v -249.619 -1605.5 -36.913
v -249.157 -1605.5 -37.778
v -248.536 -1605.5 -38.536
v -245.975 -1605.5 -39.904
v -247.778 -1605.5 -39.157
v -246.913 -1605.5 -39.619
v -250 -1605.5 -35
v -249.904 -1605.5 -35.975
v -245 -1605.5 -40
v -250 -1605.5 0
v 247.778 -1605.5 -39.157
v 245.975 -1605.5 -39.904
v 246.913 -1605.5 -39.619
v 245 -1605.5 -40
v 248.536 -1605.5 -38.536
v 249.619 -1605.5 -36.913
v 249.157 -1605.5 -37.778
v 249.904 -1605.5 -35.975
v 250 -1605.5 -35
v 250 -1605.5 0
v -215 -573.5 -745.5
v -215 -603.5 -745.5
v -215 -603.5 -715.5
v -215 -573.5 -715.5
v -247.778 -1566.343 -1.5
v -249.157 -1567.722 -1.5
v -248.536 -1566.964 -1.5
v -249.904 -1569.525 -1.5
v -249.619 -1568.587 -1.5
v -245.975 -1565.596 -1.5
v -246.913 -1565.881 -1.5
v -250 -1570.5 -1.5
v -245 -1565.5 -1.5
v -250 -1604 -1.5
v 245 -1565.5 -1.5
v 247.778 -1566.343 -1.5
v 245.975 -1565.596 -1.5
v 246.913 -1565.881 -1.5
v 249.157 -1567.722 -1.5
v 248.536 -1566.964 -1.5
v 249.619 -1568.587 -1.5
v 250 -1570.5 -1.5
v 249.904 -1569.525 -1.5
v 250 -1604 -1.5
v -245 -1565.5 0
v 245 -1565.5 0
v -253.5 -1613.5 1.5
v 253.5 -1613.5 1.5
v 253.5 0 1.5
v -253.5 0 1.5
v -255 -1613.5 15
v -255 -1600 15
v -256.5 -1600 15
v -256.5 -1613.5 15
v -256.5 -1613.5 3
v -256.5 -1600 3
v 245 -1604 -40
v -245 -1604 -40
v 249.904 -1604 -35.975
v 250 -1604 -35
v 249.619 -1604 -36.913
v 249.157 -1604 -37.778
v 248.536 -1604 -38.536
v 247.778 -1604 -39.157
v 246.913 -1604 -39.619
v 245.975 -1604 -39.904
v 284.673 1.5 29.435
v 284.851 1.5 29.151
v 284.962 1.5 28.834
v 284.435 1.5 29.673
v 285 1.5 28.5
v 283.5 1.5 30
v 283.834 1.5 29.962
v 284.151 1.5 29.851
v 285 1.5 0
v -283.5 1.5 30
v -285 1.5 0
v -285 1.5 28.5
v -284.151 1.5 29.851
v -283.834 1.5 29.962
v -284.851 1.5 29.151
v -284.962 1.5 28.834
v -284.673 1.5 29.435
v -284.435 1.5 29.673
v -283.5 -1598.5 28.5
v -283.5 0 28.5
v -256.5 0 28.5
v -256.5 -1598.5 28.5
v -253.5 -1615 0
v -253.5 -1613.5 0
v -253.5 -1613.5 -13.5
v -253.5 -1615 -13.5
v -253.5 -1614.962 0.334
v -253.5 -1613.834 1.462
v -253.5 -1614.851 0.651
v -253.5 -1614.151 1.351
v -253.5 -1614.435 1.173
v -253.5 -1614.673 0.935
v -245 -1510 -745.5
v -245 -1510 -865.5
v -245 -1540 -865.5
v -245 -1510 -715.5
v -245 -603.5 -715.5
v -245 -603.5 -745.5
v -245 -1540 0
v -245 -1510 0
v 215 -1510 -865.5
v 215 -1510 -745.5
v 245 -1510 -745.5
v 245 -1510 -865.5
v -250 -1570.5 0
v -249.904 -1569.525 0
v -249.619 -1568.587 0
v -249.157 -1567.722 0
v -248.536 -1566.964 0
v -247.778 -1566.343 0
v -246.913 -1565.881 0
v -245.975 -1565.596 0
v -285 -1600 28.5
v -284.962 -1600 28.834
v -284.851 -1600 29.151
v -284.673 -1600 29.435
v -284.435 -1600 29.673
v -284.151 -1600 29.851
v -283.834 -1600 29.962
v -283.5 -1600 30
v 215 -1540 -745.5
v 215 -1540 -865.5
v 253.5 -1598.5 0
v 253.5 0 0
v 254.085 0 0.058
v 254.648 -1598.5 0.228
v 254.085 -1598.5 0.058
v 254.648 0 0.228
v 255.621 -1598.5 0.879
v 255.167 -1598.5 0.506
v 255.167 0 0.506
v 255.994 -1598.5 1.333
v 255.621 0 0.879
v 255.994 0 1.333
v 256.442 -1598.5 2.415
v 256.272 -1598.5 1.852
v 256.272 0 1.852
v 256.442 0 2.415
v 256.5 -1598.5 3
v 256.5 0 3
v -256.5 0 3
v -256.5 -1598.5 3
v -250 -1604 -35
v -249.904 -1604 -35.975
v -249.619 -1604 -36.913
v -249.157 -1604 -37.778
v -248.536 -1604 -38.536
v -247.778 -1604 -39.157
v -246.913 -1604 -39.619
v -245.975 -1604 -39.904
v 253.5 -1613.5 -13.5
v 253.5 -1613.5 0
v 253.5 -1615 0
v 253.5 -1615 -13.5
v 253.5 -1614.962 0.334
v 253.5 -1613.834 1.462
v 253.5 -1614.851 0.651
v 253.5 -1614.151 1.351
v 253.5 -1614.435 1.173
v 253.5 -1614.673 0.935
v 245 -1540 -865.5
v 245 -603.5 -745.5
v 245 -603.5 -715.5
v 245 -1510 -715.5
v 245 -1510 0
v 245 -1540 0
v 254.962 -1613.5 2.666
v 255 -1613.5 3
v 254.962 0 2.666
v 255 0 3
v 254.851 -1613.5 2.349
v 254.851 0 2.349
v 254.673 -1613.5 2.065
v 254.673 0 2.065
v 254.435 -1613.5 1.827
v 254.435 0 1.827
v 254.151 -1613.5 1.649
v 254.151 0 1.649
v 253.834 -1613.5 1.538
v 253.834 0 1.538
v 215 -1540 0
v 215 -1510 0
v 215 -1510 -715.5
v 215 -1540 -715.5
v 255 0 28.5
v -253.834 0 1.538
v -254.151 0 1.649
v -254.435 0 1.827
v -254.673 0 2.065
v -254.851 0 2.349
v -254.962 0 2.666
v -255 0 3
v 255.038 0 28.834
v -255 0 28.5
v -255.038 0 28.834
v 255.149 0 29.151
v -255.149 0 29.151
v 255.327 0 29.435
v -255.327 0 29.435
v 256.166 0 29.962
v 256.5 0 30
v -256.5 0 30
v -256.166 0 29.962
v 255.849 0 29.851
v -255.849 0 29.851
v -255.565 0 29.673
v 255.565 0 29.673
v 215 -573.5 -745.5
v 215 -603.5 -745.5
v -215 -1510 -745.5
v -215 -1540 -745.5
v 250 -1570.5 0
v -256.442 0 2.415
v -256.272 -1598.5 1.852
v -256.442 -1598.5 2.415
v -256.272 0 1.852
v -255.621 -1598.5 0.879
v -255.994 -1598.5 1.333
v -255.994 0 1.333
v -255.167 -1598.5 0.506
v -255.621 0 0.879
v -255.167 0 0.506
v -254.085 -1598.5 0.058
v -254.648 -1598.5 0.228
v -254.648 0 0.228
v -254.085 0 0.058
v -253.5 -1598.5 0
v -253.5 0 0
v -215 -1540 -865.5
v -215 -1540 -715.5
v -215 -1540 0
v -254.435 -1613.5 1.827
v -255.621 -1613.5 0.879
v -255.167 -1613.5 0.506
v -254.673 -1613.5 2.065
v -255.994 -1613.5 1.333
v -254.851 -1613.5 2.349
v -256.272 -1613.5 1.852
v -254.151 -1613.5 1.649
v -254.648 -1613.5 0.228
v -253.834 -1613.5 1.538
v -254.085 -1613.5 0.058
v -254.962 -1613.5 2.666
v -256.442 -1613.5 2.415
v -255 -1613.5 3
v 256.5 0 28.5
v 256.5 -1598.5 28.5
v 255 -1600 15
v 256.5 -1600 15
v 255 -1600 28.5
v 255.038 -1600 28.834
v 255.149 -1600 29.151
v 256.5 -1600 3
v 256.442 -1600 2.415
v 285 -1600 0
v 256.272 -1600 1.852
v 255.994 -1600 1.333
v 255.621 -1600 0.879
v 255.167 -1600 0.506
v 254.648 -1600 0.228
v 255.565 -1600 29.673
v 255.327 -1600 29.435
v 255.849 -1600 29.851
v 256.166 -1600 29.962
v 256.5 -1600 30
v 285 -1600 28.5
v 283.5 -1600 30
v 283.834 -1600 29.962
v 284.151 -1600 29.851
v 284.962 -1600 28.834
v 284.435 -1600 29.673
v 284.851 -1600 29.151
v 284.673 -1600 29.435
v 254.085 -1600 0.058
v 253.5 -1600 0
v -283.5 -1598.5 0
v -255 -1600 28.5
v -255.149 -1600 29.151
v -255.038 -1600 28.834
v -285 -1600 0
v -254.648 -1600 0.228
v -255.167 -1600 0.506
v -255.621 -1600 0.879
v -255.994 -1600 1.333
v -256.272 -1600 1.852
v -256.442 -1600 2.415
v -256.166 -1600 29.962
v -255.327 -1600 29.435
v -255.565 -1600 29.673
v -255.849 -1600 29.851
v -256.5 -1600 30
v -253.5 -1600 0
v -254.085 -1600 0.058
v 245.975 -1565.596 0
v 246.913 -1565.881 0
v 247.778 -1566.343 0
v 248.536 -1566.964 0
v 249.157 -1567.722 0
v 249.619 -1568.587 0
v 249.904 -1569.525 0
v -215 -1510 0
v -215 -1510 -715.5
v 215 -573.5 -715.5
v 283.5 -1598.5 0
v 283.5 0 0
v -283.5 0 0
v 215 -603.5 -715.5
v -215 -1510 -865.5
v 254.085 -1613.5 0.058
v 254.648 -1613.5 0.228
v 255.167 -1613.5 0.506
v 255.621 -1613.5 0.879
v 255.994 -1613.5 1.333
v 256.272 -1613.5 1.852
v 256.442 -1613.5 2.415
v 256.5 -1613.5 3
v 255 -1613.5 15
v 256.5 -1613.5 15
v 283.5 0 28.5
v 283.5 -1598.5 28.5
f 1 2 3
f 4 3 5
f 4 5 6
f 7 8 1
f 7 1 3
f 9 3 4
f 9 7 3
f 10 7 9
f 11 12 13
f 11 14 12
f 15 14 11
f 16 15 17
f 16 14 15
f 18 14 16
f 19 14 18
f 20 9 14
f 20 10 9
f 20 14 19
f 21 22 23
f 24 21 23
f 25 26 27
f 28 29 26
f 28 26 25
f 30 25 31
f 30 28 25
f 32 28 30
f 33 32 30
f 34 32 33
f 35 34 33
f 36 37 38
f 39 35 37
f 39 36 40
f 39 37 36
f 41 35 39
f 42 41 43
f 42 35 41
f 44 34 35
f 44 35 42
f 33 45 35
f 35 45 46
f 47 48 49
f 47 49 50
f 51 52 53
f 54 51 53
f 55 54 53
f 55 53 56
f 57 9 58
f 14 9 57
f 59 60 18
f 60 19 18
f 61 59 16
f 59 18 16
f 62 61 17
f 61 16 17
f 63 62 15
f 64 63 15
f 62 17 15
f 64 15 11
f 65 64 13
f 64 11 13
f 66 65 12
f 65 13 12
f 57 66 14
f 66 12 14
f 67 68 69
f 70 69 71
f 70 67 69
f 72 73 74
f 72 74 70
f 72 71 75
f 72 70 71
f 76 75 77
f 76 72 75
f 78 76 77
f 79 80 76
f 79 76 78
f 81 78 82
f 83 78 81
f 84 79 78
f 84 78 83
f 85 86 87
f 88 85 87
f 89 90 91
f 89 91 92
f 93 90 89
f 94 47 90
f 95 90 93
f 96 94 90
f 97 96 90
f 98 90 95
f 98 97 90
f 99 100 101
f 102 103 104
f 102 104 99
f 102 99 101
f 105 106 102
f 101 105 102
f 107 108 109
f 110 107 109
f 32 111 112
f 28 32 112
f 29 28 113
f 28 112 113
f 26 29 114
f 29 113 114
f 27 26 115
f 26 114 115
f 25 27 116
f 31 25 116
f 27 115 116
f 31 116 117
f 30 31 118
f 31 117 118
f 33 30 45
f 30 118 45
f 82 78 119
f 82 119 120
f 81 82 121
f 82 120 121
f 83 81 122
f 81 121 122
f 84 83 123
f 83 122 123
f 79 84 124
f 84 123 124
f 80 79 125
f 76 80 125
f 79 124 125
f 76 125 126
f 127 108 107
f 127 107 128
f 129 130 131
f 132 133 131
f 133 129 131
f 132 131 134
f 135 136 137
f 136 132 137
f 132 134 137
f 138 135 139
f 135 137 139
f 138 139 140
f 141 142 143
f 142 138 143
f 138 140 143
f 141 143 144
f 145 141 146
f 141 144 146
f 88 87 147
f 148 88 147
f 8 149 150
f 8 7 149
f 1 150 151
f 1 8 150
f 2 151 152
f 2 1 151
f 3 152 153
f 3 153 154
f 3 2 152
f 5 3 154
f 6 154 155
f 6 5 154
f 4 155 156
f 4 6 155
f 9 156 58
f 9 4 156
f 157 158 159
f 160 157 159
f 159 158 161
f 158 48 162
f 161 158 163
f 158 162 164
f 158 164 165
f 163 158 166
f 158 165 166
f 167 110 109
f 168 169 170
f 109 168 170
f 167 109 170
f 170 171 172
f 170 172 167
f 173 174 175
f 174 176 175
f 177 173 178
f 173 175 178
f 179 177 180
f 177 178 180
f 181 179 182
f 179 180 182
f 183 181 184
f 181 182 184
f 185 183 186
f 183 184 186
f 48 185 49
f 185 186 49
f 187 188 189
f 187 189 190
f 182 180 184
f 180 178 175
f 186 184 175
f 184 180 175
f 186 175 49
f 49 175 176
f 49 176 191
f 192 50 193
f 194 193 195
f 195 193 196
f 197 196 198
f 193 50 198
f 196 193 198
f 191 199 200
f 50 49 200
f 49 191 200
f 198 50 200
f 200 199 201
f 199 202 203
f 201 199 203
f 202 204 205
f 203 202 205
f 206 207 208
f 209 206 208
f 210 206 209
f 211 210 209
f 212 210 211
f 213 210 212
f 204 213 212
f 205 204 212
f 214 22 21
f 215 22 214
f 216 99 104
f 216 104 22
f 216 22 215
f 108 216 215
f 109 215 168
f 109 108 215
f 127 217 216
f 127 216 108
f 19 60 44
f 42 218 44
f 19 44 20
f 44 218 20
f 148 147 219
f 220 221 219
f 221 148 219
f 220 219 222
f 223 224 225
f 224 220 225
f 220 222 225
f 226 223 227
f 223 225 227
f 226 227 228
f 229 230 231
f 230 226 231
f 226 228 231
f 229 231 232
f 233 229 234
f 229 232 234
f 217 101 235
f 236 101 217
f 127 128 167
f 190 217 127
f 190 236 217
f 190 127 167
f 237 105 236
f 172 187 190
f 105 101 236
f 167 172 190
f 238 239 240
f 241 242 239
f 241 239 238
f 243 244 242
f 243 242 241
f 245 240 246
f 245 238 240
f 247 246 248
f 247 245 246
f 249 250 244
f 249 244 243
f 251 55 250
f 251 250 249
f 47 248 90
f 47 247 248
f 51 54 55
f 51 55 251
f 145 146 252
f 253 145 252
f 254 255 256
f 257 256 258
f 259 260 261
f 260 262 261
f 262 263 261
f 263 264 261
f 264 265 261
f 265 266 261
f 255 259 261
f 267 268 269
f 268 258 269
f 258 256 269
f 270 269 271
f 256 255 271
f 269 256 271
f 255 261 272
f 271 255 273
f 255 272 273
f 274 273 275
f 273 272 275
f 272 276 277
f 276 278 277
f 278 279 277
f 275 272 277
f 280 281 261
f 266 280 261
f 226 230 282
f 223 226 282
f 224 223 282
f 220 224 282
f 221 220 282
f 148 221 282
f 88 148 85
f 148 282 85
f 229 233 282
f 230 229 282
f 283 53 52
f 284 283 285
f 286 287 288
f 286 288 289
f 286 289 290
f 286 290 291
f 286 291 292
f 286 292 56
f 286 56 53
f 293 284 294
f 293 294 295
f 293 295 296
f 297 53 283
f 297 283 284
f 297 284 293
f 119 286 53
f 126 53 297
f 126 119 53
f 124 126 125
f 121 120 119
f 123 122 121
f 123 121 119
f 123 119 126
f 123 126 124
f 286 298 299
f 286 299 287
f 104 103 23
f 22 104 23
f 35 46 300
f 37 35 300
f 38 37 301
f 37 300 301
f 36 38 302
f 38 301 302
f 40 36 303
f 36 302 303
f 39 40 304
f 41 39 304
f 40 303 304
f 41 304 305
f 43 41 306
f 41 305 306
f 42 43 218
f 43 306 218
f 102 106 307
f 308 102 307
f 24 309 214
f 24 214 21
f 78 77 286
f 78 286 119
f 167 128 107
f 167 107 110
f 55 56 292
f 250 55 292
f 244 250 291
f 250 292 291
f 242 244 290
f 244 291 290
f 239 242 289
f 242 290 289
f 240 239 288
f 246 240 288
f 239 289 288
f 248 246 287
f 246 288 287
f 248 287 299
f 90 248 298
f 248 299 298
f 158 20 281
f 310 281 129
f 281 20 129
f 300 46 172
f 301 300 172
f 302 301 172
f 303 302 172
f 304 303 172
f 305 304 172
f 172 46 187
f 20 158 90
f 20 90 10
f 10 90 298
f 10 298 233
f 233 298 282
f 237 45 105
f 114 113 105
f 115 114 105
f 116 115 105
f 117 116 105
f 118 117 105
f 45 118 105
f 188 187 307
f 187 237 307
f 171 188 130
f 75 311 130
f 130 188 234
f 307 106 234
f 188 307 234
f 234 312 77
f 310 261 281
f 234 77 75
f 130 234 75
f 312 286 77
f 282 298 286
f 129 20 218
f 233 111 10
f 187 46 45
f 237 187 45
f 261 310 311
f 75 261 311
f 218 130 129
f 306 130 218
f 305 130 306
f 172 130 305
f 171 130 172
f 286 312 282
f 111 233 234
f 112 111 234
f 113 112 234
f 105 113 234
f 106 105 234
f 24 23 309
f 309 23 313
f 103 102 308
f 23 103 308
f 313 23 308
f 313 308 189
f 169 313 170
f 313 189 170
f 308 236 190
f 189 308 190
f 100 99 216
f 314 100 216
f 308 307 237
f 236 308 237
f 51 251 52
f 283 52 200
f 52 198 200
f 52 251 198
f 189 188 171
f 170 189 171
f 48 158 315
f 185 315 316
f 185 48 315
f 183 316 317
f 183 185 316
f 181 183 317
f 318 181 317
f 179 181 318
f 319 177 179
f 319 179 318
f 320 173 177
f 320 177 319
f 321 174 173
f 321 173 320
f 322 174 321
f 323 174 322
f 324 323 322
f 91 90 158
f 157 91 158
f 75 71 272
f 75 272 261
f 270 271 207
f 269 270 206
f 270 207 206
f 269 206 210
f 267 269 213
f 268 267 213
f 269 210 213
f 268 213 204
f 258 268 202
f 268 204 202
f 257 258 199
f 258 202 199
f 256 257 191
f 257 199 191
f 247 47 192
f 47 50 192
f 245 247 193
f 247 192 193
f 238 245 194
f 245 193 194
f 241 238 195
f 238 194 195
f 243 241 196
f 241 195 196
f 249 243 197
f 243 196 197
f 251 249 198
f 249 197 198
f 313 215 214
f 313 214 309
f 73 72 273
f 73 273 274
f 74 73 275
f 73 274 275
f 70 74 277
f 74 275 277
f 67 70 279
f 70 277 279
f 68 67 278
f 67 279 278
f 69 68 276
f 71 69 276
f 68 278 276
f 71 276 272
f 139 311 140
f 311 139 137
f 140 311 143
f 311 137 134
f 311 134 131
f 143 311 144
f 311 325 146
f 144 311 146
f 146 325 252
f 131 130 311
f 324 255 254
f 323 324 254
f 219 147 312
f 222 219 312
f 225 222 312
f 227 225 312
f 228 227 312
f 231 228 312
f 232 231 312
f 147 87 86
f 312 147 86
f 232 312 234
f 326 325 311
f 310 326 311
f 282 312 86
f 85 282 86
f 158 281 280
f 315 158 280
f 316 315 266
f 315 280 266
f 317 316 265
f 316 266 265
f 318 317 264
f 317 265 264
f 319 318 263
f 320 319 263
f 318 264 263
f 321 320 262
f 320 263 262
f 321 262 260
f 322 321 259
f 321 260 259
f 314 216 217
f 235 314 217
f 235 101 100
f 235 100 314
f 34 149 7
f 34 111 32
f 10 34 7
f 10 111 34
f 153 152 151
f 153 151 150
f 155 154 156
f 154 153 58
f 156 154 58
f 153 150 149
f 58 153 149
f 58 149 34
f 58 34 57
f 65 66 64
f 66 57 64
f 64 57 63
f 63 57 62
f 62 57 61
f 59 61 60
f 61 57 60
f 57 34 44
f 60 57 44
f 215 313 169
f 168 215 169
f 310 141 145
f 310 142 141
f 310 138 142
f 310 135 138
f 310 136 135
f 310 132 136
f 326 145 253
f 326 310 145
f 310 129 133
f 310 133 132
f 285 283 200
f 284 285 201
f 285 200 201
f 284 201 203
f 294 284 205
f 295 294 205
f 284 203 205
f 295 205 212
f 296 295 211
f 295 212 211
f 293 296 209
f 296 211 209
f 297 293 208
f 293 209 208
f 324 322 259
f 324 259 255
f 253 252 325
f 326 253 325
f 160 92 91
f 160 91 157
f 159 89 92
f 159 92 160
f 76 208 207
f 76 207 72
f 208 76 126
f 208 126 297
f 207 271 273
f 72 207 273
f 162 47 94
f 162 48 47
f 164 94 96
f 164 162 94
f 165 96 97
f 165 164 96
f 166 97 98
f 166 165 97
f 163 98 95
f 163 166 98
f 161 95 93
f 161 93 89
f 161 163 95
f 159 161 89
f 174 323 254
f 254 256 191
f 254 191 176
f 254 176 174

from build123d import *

# Parameters (mm, degrees)
F1_DEPTH  = 1600
F3_DEPTH  = 1.5
F5_DEPTH  = 13.5
F6_W      = 507
F6_H      = 1.5
F7_ANGLE  = 90
F8_W      = 507
F8_H      = 1.5
F9_DEPTH  = 13.5
F10_W     = 1.5
F10_H     = 28.5
F12_W     = 1.5
F12_H     = 28.5
F15_DEPTH = 1.5
F16_W     = 500
F16_H     = 1.5
F17_DEPTH = 38.5
F18_R     = 5
F19_W     = 30
F19_H     = 30
F20_DEPTH = 865.5
F21_W     = 490
F21_H     = 30
F22_DEPTH = 936.5
F23_W     = 430
F23_H     = 30
F24_DEPTH = 30


with BuildPart() as f1:
    # F0 (on Front) → F1 (new body)
    with BuildSketch(Plane.XZ):
        with BuildLine():
            Line((-285, 28.5), (-285, 0))
            Line((-285, 0), (-283.5, 0))
            Line((-283.5, 0), (-283.5, 28.5))
            Line((-283.5, 28.5), (-256.5, 28.5))
            Line((-256.5, 28.5), (-256.5, 3))
            ThreePointArc((-256.5, 3), (-255.6213203436, 0.8786796564), (-253.5, 0))
            Line((-253.5, 0), (253.5, 0))
            ThreePointArc((253.5, 0), (255.6213203436, 0.8786796564), (256.5, 3))
            Line((256.5, 3), (256.5, 28.5))
            Line((256.5, 28.5), (283.5, 28.5))
            Line((283.5, 28.5), (283.5, 0))
            Line((283.5, 0), (285, 0))
            Line((285, 0), (285, 28.5))
            ThreePointArc((285, 28.5), (284.5606601718, 29.5606601718), (283.5, 30))
            Line((283.5, 30), (256.5, 30))
            ThreePointArc((256.5, 30), (255.4393398282, 29.5606601718), (255, 28.5))
            Line((255, 28.5), (255, 3))
            ThreePointArc((255, 3), (254.5606601718, 1.9393398282), (253.5, 1.5))
            Line((253.5, 1.5), (-253.5, 1.5))
            ThreePointArc((-253.5, 1.5), (-254.5606601718, 1.9393398282), (-255, 3))
            Line((-255, 3), (-255, 28.5))
            ThreePointArc((-255, 28.5), (-255.4393398282, 29.5606601718), (-256.5, 30))
            Line((-256.5, 30), (-283.5, 30))
            ThreePointArc((-283.5, 30), (-284.5606601718, 29.5606601718), (-285, 28.5))
        make_face()
    extrude(amount=F1_DEPTH)

    # F2 (on face) → F3 (join)
    with BuildSketch(Plane(origin=(0, 0, 0), x_dir=(-1, 0, 0), z_dir=(0, 1, 0))):
        with BuildLine():
            ThreePointArc((-283.5, 30), (-284.5606601718, 29.5606601718), (-285, 28.5))
            Line((-285, 28.5), (-285, 0))
            Line((-285, 0), (285, 0))
            Line((285, 0), (285, 28.5))
            ThreePointArc((285, 28.5), (284.5606601718, 29.5606601718), (283.5, 30))
            Line((283.5, 30), (-283.5, 30))
        make_face()
    extrude(amount=F3_DEPTH)

    # F4 (on face) → F5 (join)
    with BuildSketch(Plane.XZ.offset(1600)):
        with BuildLine():
            ThreePointArc((253.5, 0), (255.6213203436, 0.8786796564), (256.5, 3))
            Line((256.5, 3), (256.5, 15))
            Line((256.5, 15), (255, 15))
            Line((255, 15), (255, 3))
            ThreePointArc((255, 3), (254.5606601718, 1.9393398282), (253.5, 1.5))
            Line((253.5, 1.5), (-253.5, 1.5))
            ThreePointArc((-253.5, 1.5), (-254.5606601718, 1.9393398282), (-255, 3))
            Line((-255, 3), (-255, 15))
            Line((-255, 15), (-256.5, 15))
            Line((-256.5, 15), (-256.5, 3))
            ThreePointArc((-256.5, 3), (-255.6213203436, 0.8786796564), (-253.5, 0))
            Line((-253.5, 0), (253.5, 0))
        make_face()
    extrude(amount=F5_DEPTH)

    # F6 (on face) → F7 (revolve)
    with BuildSketch(Plane.XZ.offset(1613.5)):
        with Locations((0, 0.75)):
            Rectangle(F6_W, F6_H)
    revolve(axis=Axis((0, -1613.5, 0), (1, 0, 0)), revolution_arc=F7_ANGLE)

    # F8 (on face) → F9 (join)
    with BuildSketch(Plane(origin=(0, 0, 0), x_dir=(1, 0, 0), z_dir=(0, 0, -1))):
        with Locations((0, 1614.25)):
            Rectangle(F8_W, F8_H)
    extrude(amount=F9_DEPTH)

    # F10 (on face) → F11 (join, up to the next surface of F1)
    with BuildSketch(Plane(origin=(283.5, 0, 0), x_dir=(0, -1, 0), z_dir=(-1, 0, 0))):
        with Locations((1599.25, 14.25)):
            Rectangle(F10_W, F10_H)
    extrude(until=Until.NEXT)

    # F12 (on face) → F13 (join, up to the next surface of F1)
    with BuildSketch(Plane.YZ.offset(-283.5)):
        with Locations((-1599.25, 14.25)):
            Rectangle(F12_W, F12_H)
    extrude(until=Until.NEXT)

    # F14 (on face) → F15 (join)
    with BuildSketch(Plane(origin=(0, 0, 0), x_dir=(1, 0, 0), z_dir=(0, 0, -1))):
        with BuildLine():
            Line((250, 1570.5), (250, 1605.5))
            Line((250, 1605.5), (-250, 1605.5))
            Line((-250, 1605.5), (-250, 1570.5))
            ThreePointArc((-250, 1570.5), (-248.5355339059, 1566.9644660941), (-245, 1565.5))
            Line((-245, 1565.5), (245, 1565.5))
            ThreePointArc((245, 1565.5), (248.5355339059, 1566.9644660941), (250, 1570.5))
        make_face()
    extrude(amount=F15_DEPTH)

    # F16 (on face) → F17 (join)
    with BuildSketch(Plane(origin=(0, 0, -1.5), x_dir=(1, 0, 0), z_dir=(0, 0, -1))):
        with Locations((0, 1604.75)):
            Rectangle(F16_W, F16_H)
    extrude(amount=F17_DEPTH)

    # F18
    f18_edges = [f1.edges().sort_by_distance(p)[0] for p in [
        (-250, -1604.75, -40),
        (250, -1604.75, -40),
    ]]
    fillet(f18_edges, radius=F18_R)

    # F19 (on face) → F20 (join)
    with BuildSketch(Plane(origin=(0, 0, 0), x_dir=(1, 0, 0), z_dir=(0, 0, -1))):
        with Locations((-230, 1525)):
            Rectangle(F19_W, F19_H)
        with Locations((230, 1525)):
            Rectangle(F19_W, F19_H)
    extrude(amount=F20_DEPTH)

    # F21 (on face) → F22 (join)
    with BuildSketch(Plane.XZ.offset(1540)):
        with Locations((0, -730.5)):
            Rectangle(F21_W, F21_H)
    extrude(amount=-F22_DEPTH)

    # F23 (on face) → F24 (join)
    with BuildSketch(Plane(origin=(0, -603.5, 0), x_dir=(-1, 0, 0), z_dir=(0, 1, 0))):
        with Locations((0, -730.5)):
            Rectangle(F23_W, F23_H)
    extrude(amount=F24_DEPTH)


solid = f1.part
